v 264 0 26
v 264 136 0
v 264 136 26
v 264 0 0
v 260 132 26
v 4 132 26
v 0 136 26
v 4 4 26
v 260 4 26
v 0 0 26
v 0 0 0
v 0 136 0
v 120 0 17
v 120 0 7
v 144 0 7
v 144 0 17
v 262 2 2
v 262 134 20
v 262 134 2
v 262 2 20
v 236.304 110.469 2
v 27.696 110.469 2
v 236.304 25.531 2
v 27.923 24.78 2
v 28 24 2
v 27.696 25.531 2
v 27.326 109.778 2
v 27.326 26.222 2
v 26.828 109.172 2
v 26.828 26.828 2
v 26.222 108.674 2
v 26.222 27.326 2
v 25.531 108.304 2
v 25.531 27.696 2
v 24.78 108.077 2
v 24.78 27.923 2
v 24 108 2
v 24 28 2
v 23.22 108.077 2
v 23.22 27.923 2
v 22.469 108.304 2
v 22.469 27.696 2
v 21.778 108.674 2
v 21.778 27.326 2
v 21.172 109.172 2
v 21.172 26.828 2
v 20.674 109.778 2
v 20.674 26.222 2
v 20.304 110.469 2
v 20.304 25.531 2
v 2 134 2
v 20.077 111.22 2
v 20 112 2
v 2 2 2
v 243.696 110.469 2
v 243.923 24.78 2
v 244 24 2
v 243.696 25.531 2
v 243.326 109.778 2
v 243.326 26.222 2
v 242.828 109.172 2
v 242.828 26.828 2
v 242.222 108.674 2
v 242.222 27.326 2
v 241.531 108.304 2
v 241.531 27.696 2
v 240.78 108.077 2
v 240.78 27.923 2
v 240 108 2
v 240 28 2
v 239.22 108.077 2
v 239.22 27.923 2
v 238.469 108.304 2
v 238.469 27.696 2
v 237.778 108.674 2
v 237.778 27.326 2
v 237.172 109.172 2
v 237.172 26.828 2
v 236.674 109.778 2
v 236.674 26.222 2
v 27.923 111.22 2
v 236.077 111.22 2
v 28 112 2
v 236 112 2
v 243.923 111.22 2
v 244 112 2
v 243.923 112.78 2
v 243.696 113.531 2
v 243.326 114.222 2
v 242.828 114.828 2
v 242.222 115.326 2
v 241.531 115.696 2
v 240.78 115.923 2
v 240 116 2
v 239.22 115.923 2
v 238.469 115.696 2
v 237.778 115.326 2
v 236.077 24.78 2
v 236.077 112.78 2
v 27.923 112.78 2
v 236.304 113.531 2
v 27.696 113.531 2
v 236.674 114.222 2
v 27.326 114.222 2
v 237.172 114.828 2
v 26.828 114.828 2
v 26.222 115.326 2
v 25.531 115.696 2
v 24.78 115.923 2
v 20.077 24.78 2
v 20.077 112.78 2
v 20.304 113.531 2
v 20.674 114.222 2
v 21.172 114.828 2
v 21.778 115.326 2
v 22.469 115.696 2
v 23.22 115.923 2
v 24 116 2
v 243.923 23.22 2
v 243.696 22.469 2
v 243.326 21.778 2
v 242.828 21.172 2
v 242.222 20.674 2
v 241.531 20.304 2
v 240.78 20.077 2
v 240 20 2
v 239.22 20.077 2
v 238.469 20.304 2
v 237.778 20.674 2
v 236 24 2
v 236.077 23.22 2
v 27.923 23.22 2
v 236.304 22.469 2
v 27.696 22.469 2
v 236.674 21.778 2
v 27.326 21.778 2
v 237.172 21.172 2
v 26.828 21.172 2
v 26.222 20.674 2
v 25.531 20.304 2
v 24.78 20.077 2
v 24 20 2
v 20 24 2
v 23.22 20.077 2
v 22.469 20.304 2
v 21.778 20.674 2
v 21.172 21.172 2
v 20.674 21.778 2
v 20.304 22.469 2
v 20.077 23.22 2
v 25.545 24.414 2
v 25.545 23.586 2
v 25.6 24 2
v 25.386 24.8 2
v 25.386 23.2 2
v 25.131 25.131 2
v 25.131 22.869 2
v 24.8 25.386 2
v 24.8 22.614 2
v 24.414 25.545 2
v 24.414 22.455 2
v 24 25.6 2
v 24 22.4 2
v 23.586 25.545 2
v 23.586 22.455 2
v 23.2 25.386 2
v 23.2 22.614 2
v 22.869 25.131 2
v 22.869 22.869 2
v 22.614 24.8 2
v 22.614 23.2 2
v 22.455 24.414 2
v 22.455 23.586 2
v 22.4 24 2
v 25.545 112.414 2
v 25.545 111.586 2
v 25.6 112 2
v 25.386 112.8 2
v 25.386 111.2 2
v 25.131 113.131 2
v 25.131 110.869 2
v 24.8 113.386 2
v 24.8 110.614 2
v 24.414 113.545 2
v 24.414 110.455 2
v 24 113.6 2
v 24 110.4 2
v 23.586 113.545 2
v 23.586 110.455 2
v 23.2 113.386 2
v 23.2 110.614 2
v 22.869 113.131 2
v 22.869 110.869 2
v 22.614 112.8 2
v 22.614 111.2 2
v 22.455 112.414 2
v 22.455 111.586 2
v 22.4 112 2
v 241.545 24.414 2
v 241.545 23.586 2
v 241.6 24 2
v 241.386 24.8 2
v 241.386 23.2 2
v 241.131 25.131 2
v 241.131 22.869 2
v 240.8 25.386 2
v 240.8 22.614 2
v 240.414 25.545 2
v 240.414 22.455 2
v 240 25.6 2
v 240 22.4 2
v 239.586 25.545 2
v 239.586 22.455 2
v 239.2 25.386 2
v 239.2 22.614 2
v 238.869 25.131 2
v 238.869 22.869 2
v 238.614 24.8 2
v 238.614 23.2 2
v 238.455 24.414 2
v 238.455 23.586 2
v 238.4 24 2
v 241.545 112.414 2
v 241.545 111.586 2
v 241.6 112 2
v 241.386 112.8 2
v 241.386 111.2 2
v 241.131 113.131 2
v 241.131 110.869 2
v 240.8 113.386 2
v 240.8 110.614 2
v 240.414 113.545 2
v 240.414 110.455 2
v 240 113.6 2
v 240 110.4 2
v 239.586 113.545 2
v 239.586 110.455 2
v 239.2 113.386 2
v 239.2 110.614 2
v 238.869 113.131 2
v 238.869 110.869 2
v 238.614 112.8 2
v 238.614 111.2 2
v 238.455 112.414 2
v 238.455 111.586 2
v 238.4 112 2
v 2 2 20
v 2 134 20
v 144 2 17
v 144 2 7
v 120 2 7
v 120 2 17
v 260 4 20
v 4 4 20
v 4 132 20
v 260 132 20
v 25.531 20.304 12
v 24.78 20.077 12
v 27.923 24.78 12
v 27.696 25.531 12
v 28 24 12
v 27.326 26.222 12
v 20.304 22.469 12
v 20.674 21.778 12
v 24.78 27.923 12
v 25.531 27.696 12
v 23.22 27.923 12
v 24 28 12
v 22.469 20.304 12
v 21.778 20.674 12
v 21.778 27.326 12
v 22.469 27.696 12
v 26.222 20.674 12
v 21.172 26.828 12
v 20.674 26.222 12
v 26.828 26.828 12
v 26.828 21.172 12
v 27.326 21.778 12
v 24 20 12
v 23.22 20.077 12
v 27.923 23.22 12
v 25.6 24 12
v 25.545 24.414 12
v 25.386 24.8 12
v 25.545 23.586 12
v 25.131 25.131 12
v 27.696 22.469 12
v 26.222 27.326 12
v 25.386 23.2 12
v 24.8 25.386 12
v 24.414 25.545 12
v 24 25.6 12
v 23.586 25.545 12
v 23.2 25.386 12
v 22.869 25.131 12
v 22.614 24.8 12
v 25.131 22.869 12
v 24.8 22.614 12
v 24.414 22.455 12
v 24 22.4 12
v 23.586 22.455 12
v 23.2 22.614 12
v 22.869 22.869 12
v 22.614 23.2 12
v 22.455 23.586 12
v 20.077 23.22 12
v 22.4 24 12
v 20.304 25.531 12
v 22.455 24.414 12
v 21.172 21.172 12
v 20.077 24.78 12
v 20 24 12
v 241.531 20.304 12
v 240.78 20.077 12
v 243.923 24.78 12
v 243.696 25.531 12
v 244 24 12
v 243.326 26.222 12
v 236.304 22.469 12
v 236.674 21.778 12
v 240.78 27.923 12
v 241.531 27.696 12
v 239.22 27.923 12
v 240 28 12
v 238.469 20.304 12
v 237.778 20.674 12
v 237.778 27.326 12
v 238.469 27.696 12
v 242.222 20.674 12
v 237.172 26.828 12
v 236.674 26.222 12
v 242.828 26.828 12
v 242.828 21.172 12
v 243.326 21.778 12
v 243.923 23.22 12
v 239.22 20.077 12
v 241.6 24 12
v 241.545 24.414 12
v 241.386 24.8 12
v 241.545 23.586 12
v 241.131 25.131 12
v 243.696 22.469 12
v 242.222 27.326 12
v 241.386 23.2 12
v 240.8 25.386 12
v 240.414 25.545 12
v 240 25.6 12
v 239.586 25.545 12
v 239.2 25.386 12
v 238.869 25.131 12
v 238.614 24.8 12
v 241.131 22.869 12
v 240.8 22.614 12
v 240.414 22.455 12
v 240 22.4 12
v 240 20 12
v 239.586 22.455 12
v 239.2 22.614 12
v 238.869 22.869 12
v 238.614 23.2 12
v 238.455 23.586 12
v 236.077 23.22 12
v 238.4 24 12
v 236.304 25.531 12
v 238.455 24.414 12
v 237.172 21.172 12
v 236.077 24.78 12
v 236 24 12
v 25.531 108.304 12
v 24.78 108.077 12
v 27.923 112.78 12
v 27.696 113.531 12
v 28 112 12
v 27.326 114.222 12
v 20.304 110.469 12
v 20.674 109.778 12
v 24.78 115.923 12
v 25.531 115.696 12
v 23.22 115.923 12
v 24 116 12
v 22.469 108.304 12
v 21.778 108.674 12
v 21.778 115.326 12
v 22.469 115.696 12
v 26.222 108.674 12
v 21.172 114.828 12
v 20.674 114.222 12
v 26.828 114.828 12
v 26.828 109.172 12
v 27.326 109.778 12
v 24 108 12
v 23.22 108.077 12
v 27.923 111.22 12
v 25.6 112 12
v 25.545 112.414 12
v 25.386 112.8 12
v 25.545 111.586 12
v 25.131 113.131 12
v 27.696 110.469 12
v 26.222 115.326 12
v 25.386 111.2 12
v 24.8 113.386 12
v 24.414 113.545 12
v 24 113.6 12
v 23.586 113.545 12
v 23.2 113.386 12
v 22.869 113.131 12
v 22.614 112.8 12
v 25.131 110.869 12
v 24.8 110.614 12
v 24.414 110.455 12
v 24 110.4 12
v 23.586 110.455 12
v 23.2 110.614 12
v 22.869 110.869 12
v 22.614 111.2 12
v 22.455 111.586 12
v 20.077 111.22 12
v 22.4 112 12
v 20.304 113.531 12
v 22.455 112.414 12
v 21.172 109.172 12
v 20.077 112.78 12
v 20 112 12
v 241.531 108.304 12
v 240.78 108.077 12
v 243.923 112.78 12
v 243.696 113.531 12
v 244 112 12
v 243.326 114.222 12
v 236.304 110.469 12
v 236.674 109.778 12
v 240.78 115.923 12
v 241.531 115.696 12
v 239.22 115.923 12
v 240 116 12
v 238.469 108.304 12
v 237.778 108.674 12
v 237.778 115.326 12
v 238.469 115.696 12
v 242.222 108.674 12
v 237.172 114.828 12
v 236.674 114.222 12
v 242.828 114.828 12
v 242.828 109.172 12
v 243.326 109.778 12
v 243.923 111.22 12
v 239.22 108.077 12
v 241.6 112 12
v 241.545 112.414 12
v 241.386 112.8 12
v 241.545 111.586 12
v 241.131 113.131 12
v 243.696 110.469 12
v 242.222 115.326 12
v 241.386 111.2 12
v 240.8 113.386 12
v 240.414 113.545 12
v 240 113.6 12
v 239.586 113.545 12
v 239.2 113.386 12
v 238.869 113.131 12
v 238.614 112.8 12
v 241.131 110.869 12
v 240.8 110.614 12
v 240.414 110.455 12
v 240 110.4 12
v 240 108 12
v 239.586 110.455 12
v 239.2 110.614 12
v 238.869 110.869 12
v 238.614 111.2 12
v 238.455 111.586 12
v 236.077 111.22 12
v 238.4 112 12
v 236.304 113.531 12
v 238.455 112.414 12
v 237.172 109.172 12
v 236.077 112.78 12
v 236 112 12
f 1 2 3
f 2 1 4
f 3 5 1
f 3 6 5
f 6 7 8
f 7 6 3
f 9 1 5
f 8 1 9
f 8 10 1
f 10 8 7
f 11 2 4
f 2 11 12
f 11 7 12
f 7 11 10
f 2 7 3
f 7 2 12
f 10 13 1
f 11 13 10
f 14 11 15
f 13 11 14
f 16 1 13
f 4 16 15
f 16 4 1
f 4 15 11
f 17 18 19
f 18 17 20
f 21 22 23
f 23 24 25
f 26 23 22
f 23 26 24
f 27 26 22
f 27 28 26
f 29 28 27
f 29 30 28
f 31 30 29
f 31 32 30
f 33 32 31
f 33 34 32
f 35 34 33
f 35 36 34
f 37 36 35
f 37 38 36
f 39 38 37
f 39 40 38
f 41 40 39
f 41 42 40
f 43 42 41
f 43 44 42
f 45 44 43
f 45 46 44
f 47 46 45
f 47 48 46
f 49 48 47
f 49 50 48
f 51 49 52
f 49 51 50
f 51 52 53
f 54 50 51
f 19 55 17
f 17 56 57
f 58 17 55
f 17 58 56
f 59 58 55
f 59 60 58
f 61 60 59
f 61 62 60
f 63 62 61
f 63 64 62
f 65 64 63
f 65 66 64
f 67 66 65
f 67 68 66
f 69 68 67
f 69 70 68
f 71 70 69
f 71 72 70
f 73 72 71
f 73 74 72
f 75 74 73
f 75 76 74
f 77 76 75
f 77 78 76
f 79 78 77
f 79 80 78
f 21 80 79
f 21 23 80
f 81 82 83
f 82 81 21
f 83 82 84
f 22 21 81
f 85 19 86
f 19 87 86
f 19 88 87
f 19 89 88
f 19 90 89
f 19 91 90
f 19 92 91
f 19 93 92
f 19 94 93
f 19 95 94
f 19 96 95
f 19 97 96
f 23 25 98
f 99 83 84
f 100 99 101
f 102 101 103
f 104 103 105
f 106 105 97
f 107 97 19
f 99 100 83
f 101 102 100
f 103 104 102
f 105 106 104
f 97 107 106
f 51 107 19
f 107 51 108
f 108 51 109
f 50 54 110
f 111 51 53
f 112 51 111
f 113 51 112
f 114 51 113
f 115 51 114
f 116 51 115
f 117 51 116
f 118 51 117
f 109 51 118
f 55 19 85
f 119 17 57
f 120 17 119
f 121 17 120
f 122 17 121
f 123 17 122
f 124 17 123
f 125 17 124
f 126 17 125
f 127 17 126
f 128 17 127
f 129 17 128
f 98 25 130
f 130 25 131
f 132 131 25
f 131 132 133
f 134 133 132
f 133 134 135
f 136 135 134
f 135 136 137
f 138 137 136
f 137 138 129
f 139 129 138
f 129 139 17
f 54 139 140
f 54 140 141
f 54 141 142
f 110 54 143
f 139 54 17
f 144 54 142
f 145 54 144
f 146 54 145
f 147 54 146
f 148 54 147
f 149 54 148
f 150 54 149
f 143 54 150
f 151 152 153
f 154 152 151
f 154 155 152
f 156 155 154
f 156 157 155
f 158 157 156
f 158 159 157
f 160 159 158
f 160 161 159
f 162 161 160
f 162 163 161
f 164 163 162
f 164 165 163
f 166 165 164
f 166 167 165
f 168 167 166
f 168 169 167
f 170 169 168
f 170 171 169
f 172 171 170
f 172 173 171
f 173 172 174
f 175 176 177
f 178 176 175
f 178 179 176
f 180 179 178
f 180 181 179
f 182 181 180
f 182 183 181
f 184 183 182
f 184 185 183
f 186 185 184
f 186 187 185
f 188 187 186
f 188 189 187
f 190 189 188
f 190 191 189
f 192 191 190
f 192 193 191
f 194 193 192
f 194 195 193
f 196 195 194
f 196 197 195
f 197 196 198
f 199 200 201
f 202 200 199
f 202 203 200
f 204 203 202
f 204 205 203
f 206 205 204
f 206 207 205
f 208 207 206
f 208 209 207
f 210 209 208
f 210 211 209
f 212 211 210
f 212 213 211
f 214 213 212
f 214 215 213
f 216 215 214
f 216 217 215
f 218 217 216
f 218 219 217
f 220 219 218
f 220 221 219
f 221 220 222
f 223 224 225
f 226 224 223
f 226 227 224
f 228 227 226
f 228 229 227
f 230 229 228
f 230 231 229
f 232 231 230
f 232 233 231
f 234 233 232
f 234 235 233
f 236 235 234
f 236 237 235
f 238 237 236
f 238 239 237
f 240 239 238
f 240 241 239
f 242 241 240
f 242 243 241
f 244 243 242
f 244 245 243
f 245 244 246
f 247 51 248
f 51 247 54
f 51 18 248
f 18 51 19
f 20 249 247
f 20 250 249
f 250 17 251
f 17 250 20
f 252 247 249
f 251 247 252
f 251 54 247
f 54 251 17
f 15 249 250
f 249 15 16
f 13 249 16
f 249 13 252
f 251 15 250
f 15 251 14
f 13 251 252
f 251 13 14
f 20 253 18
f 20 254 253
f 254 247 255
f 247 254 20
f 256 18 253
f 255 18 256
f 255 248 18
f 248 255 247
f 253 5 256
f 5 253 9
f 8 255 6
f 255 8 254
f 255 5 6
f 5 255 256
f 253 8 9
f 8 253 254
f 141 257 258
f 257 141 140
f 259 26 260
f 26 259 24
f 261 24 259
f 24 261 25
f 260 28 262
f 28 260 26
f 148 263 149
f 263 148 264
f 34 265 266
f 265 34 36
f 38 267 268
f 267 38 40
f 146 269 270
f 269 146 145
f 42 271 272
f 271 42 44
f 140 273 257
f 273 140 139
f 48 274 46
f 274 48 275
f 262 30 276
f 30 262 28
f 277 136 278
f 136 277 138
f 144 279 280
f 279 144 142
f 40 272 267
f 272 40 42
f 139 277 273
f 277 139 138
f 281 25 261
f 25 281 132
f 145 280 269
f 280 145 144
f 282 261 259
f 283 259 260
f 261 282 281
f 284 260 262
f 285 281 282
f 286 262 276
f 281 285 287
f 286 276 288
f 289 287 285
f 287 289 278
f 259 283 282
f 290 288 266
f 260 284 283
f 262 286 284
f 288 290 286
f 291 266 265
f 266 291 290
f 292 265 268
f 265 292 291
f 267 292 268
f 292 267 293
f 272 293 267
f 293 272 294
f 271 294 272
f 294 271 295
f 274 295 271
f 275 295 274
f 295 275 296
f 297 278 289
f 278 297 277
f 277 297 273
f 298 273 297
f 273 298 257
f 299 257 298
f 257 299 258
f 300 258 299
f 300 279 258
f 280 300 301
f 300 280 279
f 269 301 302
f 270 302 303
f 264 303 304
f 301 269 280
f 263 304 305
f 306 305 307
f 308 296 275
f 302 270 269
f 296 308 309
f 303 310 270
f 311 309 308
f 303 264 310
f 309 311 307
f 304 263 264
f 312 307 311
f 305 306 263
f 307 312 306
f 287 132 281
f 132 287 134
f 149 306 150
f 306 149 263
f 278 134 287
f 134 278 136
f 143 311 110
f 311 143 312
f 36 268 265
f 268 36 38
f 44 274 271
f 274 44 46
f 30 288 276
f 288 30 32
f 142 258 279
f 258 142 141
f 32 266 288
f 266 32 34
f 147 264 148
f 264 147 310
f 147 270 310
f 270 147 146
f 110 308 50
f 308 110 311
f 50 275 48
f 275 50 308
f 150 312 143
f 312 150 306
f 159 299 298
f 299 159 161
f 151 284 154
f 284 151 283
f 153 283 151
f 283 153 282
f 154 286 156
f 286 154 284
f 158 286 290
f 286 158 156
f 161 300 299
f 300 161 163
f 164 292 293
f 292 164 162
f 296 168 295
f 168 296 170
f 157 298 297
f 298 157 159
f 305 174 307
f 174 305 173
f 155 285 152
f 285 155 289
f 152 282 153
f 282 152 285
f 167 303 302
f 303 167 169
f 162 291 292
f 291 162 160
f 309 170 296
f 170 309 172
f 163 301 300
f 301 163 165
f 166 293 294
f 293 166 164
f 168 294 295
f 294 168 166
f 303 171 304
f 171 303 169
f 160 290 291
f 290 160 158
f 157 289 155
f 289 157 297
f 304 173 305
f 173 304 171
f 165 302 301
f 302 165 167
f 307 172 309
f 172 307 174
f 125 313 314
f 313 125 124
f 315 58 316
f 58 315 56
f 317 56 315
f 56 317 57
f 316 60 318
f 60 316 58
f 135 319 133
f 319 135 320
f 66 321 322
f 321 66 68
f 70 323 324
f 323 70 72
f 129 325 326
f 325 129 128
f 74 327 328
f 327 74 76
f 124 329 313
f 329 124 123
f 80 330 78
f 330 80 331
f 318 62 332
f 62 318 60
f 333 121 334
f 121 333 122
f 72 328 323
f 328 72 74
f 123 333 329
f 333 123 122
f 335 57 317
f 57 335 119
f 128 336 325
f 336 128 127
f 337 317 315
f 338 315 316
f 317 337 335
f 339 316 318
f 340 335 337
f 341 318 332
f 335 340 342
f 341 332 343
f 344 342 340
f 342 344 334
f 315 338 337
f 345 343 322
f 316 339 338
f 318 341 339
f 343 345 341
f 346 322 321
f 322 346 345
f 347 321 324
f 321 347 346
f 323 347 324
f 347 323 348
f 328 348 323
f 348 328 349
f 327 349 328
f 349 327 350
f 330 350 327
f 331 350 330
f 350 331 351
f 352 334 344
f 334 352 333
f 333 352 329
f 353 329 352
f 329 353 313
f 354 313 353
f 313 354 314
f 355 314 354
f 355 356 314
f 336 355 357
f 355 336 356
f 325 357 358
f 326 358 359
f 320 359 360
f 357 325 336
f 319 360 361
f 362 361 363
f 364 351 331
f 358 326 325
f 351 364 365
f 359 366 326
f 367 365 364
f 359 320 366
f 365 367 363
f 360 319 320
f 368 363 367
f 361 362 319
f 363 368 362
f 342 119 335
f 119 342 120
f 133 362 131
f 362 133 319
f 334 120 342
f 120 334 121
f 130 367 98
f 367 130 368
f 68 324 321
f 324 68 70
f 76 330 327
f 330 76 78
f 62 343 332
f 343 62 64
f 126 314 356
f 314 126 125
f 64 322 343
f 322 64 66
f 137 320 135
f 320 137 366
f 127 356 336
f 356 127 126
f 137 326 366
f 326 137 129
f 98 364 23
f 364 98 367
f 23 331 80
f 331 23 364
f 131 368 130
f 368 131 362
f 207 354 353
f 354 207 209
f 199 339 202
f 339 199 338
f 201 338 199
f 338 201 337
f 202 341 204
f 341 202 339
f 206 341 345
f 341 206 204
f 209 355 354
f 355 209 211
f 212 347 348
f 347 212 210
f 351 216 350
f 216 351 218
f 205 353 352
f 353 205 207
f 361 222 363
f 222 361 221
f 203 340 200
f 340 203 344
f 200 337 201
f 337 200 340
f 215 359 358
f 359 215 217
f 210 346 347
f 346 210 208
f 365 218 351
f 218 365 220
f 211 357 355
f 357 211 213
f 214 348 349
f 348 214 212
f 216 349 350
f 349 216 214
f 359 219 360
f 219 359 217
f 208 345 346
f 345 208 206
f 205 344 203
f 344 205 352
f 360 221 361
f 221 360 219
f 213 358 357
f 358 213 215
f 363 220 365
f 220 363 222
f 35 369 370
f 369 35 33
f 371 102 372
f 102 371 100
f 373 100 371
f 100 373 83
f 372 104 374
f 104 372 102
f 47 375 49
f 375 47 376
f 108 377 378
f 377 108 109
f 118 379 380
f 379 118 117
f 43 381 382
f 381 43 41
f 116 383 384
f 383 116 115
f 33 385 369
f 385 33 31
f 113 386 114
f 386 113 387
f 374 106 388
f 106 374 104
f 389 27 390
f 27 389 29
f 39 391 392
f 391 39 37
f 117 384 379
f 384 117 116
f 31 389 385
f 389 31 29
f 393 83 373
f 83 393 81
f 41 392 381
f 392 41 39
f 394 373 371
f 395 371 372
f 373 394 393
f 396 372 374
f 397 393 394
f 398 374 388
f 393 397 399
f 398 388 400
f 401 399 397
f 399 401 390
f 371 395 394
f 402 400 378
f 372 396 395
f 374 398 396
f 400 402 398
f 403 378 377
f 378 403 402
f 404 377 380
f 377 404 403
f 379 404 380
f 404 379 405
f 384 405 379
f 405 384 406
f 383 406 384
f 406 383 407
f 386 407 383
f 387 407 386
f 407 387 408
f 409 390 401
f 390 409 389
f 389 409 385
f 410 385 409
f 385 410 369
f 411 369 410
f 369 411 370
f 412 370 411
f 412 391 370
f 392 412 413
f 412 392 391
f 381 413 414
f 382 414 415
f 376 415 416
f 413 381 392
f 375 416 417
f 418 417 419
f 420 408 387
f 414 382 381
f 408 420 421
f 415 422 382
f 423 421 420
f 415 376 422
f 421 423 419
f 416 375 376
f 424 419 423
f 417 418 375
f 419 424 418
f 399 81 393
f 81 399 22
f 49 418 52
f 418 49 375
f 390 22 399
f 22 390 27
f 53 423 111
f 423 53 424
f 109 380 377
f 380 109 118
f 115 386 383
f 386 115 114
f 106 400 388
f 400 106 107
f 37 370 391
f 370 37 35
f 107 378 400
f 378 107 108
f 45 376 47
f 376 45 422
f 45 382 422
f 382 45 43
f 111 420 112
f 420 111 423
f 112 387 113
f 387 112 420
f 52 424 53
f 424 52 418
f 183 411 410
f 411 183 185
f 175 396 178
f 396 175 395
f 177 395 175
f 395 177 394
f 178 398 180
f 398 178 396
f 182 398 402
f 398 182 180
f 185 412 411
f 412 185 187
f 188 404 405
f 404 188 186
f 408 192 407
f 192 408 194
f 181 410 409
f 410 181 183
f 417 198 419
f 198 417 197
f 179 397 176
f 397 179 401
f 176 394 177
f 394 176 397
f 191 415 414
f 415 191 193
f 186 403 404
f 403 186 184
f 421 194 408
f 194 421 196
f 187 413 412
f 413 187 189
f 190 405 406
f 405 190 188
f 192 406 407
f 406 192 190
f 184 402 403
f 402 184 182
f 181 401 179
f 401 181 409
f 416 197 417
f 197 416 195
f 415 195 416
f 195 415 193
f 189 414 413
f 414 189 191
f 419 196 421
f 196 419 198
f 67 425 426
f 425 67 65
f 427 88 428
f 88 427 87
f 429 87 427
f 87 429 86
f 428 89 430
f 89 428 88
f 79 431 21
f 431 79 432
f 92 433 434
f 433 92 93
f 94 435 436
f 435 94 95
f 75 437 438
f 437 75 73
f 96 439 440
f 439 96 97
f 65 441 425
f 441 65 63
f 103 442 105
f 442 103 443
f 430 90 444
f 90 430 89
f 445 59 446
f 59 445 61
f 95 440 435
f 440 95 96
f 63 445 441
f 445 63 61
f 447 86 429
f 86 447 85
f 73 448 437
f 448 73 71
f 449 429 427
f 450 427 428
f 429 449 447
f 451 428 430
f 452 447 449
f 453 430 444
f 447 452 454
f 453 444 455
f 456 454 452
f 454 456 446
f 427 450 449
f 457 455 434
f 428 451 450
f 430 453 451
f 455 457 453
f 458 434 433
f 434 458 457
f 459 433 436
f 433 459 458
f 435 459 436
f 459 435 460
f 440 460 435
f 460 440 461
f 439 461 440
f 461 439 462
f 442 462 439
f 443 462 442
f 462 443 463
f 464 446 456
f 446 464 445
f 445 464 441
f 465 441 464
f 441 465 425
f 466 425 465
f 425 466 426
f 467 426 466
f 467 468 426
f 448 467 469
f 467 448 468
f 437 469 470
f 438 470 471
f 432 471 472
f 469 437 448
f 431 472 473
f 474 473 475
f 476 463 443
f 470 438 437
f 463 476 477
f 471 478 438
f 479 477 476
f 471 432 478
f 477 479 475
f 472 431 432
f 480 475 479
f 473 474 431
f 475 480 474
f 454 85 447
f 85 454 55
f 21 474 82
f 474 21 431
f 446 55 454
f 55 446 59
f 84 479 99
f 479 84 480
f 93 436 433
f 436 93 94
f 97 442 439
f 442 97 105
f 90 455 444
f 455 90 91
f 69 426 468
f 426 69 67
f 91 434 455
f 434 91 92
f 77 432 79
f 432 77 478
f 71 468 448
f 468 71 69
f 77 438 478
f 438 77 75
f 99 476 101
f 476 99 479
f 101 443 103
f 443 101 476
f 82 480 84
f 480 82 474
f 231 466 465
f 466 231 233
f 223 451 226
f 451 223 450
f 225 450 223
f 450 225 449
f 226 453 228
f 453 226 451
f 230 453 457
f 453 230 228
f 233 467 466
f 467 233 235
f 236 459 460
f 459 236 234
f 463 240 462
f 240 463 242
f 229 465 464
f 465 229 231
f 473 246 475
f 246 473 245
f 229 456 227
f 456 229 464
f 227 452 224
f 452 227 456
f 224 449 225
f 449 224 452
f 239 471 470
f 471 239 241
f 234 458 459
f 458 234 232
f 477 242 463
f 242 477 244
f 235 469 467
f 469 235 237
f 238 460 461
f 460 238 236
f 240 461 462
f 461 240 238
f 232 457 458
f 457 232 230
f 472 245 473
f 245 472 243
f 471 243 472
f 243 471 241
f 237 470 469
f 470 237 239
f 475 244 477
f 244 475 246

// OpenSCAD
panel_cols = 64;
panel_rows = 32;
pixel_pitch = 4;
clearance = 2;
shell_wall = 2;
shell_depth = 26;
lip_depth = 6;
standoff_diameter = 8;
standoff_hole = 3.2;
vent_slot_w = 6;
vent_slot_h = 28;
vent_gap = 4;

panel_w = panel_cols * pixel_pitch;
panel_h = panel_rows * pixel_pitch;
inner_w = panel_w + clearance * 2;
inner_h = panel_h + clearance * 2;
outer_w = inner_w + shell_wall * 2;
outer_h = inner_h + shell_wall * 2;

module shell_body() {
  difference() {
    cube([outer_w, outer_h, shell_depth], center = false);
    translate([shell_wall, shell_wall, shell_wall])
      cube([inner_w, inner_h, shell_depth], center = false);

    for (i = [0 : 5]) {
      translate([outer_w / 2 - 25 + i * (vent_slot_w + vent_gap), outer_h - shell_wall - vent_slot_h - 8, shell_depth - shell_wall - 0.1])
        cube([vent_slot_w, vent_slot_h, shell_wall + 0.2], center = false);
    }

    translate([outer_w / 2 - 12, 0, 7])
      cube([24, shell_wall + 0.2, 10], center = false);
  }
}

module lip() {
  difference() {
    translate([shell_wall, shell_wall, shell_depth - lip_depth])
      cube([inner_w, inner_h, lip_depth], center = false);
    translate([shell_wall + shell_wall, shell_wall + shell_wall, shell_depth - lip_depth - 0.1])
      cube([inner_w - shell_wall * 2, inner_h - shell_wall * 2, lip_depth + 0.2], center = false);
  }
}

module standoffs() {
  positions = [
    [24, 24],
    [outer_w - 24, 24],
    [24, outer_h - 24],
    [outer_w - 24, outer_h - 24]
  ];

  for (pos = positions) {
    difference() {
      translate([pos[0], pos[1], shell_wall])
        cylinder(h = 10, d = standoff_diameter, $fn = 32);
      translate([pos[0], pos[1], shell_wall - 0.1])
        cylinder(h = 10.2, d = standoff_hole, $fn = 24);
    }
  }
}

union() {
  shell_body();
  lip();
  standoffs();
}
